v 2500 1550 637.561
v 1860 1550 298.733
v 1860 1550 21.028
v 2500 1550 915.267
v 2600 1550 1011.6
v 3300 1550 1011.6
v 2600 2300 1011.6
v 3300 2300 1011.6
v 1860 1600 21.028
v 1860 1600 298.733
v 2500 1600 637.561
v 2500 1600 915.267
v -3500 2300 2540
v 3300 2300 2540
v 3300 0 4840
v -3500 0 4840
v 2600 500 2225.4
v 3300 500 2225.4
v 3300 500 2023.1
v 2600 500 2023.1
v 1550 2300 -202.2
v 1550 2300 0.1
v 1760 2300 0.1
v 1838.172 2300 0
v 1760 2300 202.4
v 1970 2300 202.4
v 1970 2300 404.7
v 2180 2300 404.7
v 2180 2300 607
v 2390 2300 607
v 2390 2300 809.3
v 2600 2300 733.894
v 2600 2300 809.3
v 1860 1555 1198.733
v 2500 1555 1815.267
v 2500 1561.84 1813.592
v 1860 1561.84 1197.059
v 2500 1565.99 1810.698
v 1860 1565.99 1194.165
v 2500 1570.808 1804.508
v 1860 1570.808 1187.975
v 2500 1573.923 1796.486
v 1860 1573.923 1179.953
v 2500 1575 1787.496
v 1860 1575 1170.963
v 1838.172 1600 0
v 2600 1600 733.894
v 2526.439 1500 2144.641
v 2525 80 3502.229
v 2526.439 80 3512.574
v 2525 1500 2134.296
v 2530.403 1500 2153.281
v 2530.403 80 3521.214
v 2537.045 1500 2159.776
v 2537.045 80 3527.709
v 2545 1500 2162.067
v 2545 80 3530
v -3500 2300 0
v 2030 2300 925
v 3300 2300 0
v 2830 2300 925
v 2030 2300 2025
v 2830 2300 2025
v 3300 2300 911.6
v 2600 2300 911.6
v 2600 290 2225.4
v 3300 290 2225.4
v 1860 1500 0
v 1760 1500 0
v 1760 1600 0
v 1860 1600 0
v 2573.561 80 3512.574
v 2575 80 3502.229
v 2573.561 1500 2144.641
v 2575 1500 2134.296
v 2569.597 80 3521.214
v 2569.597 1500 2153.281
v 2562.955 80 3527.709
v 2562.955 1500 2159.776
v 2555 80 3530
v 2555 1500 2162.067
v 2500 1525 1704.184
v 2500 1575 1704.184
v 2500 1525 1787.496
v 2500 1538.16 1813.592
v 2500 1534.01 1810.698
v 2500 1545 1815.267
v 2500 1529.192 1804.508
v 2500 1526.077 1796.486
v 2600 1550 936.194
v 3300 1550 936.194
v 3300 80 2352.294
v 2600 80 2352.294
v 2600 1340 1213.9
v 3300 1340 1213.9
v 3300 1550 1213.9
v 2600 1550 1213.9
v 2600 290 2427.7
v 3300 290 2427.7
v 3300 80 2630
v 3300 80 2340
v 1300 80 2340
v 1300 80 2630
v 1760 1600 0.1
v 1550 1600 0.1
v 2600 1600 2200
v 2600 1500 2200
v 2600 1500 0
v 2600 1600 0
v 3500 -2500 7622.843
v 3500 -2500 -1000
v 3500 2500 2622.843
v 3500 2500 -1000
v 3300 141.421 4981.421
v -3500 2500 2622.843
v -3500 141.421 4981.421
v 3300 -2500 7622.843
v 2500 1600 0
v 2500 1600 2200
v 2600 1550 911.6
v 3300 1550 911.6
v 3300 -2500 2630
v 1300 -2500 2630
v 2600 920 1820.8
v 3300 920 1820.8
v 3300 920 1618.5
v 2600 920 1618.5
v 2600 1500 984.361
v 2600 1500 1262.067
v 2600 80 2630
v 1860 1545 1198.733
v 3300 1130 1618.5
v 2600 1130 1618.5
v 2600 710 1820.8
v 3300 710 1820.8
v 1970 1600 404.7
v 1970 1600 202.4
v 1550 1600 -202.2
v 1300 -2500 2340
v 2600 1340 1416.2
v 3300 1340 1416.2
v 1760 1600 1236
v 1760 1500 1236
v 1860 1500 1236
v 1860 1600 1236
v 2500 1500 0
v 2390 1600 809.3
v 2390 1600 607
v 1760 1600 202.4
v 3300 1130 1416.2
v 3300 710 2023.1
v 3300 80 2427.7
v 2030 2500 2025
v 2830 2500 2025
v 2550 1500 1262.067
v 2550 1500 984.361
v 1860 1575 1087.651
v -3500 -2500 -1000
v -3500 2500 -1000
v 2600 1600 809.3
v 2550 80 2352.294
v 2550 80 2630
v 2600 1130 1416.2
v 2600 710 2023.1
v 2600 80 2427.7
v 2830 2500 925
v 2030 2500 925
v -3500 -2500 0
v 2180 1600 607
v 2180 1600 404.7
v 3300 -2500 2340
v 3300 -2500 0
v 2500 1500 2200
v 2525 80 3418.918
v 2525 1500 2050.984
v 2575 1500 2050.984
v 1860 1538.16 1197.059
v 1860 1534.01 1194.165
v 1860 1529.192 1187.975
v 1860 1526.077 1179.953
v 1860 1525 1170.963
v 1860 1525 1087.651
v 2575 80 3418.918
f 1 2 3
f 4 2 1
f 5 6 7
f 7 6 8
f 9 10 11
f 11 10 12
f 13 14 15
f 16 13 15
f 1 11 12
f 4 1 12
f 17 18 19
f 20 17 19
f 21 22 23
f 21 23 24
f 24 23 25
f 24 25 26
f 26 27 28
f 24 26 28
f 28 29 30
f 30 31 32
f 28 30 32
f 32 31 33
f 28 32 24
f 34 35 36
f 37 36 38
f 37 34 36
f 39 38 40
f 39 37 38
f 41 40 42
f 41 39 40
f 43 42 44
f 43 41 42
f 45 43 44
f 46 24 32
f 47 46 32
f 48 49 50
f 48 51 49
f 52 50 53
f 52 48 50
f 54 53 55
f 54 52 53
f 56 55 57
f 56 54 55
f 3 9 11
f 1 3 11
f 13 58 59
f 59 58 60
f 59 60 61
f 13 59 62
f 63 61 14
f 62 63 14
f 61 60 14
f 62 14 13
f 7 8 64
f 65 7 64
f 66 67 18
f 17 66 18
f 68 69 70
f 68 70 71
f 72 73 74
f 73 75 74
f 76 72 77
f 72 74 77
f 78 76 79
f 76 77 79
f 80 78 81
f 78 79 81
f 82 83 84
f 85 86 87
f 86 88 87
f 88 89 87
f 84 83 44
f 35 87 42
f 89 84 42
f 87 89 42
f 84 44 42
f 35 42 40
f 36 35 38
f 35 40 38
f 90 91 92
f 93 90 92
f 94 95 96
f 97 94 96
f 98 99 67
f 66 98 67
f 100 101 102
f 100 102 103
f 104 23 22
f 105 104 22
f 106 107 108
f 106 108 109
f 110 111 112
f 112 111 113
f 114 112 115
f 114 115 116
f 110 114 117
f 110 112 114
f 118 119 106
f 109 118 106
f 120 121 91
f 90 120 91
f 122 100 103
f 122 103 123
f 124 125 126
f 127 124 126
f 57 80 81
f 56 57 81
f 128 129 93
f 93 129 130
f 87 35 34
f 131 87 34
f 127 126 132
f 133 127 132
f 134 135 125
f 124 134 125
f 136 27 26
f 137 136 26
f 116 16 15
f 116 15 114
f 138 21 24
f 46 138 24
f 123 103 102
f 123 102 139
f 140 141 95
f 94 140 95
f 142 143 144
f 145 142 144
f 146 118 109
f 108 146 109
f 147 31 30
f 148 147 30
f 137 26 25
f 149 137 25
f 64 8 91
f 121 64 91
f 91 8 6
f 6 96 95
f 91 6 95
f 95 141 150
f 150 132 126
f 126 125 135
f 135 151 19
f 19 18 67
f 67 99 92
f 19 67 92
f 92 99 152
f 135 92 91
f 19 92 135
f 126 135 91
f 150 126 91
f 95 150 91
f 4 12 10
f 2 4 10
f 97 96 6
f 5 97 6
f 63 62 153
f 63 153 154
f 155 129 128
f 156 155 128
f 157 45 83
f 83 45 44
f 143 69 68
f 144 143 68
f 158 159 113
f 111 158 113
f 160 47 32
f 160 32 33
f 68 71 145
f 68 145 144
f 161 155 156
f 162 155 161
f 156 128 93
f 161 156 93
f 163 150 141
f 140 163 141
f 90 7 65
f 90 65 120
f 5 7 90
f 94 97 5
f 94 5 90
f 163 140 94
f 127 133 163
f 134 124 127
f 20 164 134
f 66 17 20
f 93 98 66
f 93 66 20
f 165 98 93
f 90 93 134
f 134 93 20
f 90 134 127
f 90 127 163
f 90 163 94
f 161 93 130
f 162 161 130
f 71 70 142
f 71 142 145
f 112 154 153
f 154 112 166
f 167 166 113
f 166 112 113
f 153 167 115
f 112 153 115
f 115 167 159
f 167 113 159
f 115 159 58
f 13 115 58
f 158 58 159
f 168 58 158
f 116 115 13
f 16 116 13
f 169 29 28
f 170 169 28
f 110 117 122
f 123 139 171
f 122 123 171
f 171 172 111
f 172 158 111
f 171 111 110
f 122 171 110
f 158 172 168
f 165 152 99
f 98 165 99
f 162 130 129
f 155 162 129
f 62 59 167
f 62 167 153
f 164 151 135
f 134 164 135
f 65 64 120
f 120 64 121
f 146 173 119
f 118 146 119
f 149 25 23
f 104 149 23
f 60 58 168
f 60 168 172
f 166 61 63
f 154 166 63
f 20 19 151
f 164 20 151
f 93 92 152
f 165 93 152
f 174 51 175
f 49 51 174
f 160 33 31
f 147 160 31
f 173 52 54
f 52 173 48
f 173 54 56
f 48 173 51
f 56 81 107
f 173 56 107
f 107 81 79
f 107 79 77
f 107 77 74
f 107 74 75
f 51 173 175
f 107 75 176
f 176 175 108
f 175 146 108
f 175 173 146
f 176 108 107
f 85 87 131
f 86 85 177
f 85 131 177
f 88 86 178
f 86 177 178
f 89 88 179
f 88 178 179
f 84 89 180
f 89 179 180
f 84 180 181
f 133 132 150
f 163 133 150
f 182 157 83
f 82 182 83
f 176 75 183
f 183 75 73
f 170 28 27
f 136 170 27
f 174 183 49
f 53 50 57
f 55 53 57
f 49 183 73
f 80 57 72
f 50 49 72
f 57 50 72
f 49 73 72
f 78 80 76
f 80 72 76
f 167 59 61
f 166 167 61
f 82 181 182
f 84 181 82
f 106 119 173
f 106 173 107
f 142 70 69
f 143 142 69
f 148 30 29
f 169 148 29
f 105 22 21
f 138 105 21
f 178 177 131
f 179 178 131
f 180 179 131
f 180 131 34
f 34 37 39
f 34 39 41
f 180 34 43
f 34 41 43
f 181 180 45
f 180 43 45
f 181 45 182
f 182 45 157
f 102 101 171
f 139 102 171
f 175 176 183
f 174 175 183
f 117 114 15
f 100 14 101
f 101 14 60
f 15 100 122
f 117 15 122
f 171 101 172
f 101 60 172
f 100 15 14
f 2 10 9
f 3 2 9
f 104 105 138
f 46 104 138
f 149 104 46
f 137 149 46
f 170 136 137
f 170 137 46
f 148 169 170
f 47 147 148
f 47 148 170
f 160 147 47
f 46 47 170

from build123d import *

# Parameters (mm, degrees)
F0_W      = 7000
F0_H      = 5000
F1_DEPTH  = 1000
F3_DEPTH  = 2300
F5_DEPTH  = 6800
F6_REACH  = 7685.420757516
F7_W      = 2580
F7_H      = 290
F8_DEPTH  = 2000
F10_DEPTH = 700
F12_DEPTH = 700
F13_W     = 800
F13_H     = 1100
F14_DEPTH = 200.001
F15_W     = 100
F15_H     = 100
F16_DEPTH = 2200
F18_START = 25
F18_DEPTH = 50
F19_W     = 100
F19_H     = 100
F20_DEPTH = 1236
F23_DEPTH = 50
F25_DEPTH = 50
F26_START = 25
F26_DEPTH = 50
F27_R     = 20
F27_2_R   = 20


with BuildPart() as f1:
    # F0 (on Top) → F1 (new body)
    with BuildSketch(Plane.XY):
        Rectangle(F0_W, F0_H)
    extrude(amount=-F1_DEPTH)

    # F2 (on face) → F3 (join)
    with BuildSketch(Plane.XY):
        Polygon((3500, -2500), (3500, 2500), (-3500, 2500), (-3500, 2300), (3300, 2300), (3300, -2500), align=None)
    extrude(amount=F3_DEPTH)

    # F4 (on face) → F5 (join, through all)
    with BuildSketch(Plane(origin=(3300, 0, 0), x_dir=(0, -1, 0), z_dir=(-1, 0, 0))):
        Polygon((-2300, 2300), (-2300, 2540), (0, 4840), (-141.4213562373, 4981.4213562373), (-2500, 2622.8427124746), (-2500, 2300), align=None)
    extrude(amount=F5_DEPTH)

    f6_end = Plane(origin=(-100, 1320.7106781187, 3802.132034356), x_dir=(0, -0.7071067812, 0.7071067812), z_dir=(0, 0.7071067812, 0.7071067812))
    # F3_face (on face) → F6 (join, up to a plane its end follows)
    with BuildSketch(Plane(origin=(3400, 0, 2300), x_dir=(1, 0, 0), z_dir=(0, 0, 1))):
        Polygon((-100, -2500), (100, -2500), (100, 2500), (-100, 2500), (-100, 2300), align=None)
    f6_long = extrude(amount=F6_REACH, mode=Mode.PRIVATE)
    add(split(f6_long, bisect_by=f6_end, keep=Keep.BOTTOM, mode=Mode.PRIVATE))

    # F7 (on face) → F8 (join)
    with BuildSketch(Plane(origin=(3300, 0, 0), x_dir=(0, -1, 0), z_dir=(-1, 0, 0))):
        with Locations((1210, 2485)):
            Rectangle(F7_W, F7_H)
    extrude(amount=F8_DEPTH)

    # F13 (on face) → F14 (cut, through all)
    with BuildSketch(Plane.XZ.offset(-2300)):
        with Locations((2430, 1475)):
            Rectangle(F13_W, F13_H)
    extrude(amount=-F14_DEPTH, mode=Mode.SUBTRACT)


with BuildPart() as f10:
    # F9 (on face) → F10 (new body)
    with BuildSketch(Plane(origin=(3300, 0, 0), x_dir=(0, -1, 0), z_dir=(-1, 0, 0))):
        Polygon((-80, 2427.7), (-290, 2427.7), (-290, 2225.4), (-500, 2225.4), (-500, 2023.1), (-710, 2023.1), (-710, 1820.8), (-920, 1820.8), (-920, 1618.5), (-1130, 1618.5), (-1130, 1416.2), (-1340, 1416.2), (-1340, 1213.9), (-1550, 1213.9), (-1550, 1011.6), (-2300, 1011.6), (-2300, 911.6), (-1550, 911.6), (-1550, 936.1943204678), (-80, 2352.2943204678), align=None)
    extrude(amount=F10_DEPTH)


with BuildPart() as f12:
    # F11 (on face) → F12 (new body)
    with BuildSketch(Plane.XZ.offset(-2300)):
        Polygon((2600, 733.8943204678), (2600, 809.3), (2390, 809.3), (2390, 607), (2180, 607), (2180, 404.7), (1970, 404.7), (1970, 202.4), (1760, 202.4), (1760, 0.1), (1550, 0.1), (1550, -202.2), (1838.1719856736, 0), align=None)
    extrude(amount=F12_DEPTH)


with BuildPart() as f16:
    # F15 (on face) → F16 (new body)
    with BuildSketch(Plane.XY):
        with Locations((2550, 1550)):
            Rectangle(F15_W, F15_H)
    extrude(amount=F16_DEPTH)

    # F17 (on face) → F18 (join)
    with BuildSketch(Plane(origin=(2600, 0, 0), x_dir=(0, -1, 0), z_dir=(-1, 0, 0)).offset(F18_START)):
        Polygon((-80, 3530), (-1500, 2162.0666666667), (-1500, 2050.9843948538), (-80, 3418.9177281871), align=None)
    extrude(amount=F18_DEPTH)

    # F27
    f27_edges = [f16.edges().sort_by_distance(p)[0] for p in [
        (2525, 790, 2846.033333),
        (2575, 790, 2846.033333),
    ]]
    fillet(f27_edges, radius=F27_R)


with BuildPart() as f20:
    # F19 (on face) → F20 (new body)
    with BuildSketch(Plane(origin=(0, 0, 0), x_dir=(1, 0, 0), z_dir=(0, 0, -1))):
        with Locations((1810, -1550)):
            Rectangle(F19_W, F19_H)
    extrude(amount=-F20_DEPTH)


with BuildPart() as f23:
    # F22 (on face) → F23 (new body)
    with BuildSketch(Plane.XZ.offset(-1600)):
        Polygon((2390, 607), (2390, 809.3), (2180, 607), align=None)
        Polygon((1860, 202.4), (1860, 21.0276538011), (2500, 637.5609871345), (2500, 809.3), (2390, 809.3), (2390, 607), (2180, 607), (2180, 404.7), (1970, 404.7), (1970, 202.4), align=None)
        Polygon((2180, 607), (1970, 404.7), (2180, 404.7), align=None)
        Polygon((1860, 298.7333333333), (1860, 202.4), (1970, 202.4), (1970, 404.7), align=None)
        Polygon((2390, 809.3), (2500, 809.3), (2500, 915.2666666667), align=None)
    extrude(amount=F23_DEPTH)


with BuildPart() as f25:
    # F24 (on face) → F25 (new body)
    with BuildSketch(Plane(origin=(2600, 0, 0), x_dir=(0, -1, 0), z_dir=(-1, 0, 0))):
        Polygon((-1500, 1262.0666666667), (-1500, 984.3609871345), (-80, 2352.2943204678), (-80, 2630), align=None)
    extrude(amount=F25_DEPTH)


with BuildPart() as f26:
    # F21 (on face) → F26 (new body)
    with BuildSketch(Plane.XZ.offset(-1600).offset(F26_START)):
        Polygon((2500, 1815.2666666667), (1860, 1198.7333333333), (1860, 1087.6510615204), (2500, 1704.1843948538), align=None)
    extrude(amount=F26_DEPTH)

    # F27#2
    f27_2_edges = [f26.edges().sort_by_distance(p)[0] for p in [
        (2180, 1575, 1507),
        (2180, 1525, 1507),
    ]]
    fillet(f27_2_edges, radius=F27_2_R)


solid = Compound([f1.part, f10.part, f12.part, f16.part, f20.part, f23.part, f25.part, f26.part])
